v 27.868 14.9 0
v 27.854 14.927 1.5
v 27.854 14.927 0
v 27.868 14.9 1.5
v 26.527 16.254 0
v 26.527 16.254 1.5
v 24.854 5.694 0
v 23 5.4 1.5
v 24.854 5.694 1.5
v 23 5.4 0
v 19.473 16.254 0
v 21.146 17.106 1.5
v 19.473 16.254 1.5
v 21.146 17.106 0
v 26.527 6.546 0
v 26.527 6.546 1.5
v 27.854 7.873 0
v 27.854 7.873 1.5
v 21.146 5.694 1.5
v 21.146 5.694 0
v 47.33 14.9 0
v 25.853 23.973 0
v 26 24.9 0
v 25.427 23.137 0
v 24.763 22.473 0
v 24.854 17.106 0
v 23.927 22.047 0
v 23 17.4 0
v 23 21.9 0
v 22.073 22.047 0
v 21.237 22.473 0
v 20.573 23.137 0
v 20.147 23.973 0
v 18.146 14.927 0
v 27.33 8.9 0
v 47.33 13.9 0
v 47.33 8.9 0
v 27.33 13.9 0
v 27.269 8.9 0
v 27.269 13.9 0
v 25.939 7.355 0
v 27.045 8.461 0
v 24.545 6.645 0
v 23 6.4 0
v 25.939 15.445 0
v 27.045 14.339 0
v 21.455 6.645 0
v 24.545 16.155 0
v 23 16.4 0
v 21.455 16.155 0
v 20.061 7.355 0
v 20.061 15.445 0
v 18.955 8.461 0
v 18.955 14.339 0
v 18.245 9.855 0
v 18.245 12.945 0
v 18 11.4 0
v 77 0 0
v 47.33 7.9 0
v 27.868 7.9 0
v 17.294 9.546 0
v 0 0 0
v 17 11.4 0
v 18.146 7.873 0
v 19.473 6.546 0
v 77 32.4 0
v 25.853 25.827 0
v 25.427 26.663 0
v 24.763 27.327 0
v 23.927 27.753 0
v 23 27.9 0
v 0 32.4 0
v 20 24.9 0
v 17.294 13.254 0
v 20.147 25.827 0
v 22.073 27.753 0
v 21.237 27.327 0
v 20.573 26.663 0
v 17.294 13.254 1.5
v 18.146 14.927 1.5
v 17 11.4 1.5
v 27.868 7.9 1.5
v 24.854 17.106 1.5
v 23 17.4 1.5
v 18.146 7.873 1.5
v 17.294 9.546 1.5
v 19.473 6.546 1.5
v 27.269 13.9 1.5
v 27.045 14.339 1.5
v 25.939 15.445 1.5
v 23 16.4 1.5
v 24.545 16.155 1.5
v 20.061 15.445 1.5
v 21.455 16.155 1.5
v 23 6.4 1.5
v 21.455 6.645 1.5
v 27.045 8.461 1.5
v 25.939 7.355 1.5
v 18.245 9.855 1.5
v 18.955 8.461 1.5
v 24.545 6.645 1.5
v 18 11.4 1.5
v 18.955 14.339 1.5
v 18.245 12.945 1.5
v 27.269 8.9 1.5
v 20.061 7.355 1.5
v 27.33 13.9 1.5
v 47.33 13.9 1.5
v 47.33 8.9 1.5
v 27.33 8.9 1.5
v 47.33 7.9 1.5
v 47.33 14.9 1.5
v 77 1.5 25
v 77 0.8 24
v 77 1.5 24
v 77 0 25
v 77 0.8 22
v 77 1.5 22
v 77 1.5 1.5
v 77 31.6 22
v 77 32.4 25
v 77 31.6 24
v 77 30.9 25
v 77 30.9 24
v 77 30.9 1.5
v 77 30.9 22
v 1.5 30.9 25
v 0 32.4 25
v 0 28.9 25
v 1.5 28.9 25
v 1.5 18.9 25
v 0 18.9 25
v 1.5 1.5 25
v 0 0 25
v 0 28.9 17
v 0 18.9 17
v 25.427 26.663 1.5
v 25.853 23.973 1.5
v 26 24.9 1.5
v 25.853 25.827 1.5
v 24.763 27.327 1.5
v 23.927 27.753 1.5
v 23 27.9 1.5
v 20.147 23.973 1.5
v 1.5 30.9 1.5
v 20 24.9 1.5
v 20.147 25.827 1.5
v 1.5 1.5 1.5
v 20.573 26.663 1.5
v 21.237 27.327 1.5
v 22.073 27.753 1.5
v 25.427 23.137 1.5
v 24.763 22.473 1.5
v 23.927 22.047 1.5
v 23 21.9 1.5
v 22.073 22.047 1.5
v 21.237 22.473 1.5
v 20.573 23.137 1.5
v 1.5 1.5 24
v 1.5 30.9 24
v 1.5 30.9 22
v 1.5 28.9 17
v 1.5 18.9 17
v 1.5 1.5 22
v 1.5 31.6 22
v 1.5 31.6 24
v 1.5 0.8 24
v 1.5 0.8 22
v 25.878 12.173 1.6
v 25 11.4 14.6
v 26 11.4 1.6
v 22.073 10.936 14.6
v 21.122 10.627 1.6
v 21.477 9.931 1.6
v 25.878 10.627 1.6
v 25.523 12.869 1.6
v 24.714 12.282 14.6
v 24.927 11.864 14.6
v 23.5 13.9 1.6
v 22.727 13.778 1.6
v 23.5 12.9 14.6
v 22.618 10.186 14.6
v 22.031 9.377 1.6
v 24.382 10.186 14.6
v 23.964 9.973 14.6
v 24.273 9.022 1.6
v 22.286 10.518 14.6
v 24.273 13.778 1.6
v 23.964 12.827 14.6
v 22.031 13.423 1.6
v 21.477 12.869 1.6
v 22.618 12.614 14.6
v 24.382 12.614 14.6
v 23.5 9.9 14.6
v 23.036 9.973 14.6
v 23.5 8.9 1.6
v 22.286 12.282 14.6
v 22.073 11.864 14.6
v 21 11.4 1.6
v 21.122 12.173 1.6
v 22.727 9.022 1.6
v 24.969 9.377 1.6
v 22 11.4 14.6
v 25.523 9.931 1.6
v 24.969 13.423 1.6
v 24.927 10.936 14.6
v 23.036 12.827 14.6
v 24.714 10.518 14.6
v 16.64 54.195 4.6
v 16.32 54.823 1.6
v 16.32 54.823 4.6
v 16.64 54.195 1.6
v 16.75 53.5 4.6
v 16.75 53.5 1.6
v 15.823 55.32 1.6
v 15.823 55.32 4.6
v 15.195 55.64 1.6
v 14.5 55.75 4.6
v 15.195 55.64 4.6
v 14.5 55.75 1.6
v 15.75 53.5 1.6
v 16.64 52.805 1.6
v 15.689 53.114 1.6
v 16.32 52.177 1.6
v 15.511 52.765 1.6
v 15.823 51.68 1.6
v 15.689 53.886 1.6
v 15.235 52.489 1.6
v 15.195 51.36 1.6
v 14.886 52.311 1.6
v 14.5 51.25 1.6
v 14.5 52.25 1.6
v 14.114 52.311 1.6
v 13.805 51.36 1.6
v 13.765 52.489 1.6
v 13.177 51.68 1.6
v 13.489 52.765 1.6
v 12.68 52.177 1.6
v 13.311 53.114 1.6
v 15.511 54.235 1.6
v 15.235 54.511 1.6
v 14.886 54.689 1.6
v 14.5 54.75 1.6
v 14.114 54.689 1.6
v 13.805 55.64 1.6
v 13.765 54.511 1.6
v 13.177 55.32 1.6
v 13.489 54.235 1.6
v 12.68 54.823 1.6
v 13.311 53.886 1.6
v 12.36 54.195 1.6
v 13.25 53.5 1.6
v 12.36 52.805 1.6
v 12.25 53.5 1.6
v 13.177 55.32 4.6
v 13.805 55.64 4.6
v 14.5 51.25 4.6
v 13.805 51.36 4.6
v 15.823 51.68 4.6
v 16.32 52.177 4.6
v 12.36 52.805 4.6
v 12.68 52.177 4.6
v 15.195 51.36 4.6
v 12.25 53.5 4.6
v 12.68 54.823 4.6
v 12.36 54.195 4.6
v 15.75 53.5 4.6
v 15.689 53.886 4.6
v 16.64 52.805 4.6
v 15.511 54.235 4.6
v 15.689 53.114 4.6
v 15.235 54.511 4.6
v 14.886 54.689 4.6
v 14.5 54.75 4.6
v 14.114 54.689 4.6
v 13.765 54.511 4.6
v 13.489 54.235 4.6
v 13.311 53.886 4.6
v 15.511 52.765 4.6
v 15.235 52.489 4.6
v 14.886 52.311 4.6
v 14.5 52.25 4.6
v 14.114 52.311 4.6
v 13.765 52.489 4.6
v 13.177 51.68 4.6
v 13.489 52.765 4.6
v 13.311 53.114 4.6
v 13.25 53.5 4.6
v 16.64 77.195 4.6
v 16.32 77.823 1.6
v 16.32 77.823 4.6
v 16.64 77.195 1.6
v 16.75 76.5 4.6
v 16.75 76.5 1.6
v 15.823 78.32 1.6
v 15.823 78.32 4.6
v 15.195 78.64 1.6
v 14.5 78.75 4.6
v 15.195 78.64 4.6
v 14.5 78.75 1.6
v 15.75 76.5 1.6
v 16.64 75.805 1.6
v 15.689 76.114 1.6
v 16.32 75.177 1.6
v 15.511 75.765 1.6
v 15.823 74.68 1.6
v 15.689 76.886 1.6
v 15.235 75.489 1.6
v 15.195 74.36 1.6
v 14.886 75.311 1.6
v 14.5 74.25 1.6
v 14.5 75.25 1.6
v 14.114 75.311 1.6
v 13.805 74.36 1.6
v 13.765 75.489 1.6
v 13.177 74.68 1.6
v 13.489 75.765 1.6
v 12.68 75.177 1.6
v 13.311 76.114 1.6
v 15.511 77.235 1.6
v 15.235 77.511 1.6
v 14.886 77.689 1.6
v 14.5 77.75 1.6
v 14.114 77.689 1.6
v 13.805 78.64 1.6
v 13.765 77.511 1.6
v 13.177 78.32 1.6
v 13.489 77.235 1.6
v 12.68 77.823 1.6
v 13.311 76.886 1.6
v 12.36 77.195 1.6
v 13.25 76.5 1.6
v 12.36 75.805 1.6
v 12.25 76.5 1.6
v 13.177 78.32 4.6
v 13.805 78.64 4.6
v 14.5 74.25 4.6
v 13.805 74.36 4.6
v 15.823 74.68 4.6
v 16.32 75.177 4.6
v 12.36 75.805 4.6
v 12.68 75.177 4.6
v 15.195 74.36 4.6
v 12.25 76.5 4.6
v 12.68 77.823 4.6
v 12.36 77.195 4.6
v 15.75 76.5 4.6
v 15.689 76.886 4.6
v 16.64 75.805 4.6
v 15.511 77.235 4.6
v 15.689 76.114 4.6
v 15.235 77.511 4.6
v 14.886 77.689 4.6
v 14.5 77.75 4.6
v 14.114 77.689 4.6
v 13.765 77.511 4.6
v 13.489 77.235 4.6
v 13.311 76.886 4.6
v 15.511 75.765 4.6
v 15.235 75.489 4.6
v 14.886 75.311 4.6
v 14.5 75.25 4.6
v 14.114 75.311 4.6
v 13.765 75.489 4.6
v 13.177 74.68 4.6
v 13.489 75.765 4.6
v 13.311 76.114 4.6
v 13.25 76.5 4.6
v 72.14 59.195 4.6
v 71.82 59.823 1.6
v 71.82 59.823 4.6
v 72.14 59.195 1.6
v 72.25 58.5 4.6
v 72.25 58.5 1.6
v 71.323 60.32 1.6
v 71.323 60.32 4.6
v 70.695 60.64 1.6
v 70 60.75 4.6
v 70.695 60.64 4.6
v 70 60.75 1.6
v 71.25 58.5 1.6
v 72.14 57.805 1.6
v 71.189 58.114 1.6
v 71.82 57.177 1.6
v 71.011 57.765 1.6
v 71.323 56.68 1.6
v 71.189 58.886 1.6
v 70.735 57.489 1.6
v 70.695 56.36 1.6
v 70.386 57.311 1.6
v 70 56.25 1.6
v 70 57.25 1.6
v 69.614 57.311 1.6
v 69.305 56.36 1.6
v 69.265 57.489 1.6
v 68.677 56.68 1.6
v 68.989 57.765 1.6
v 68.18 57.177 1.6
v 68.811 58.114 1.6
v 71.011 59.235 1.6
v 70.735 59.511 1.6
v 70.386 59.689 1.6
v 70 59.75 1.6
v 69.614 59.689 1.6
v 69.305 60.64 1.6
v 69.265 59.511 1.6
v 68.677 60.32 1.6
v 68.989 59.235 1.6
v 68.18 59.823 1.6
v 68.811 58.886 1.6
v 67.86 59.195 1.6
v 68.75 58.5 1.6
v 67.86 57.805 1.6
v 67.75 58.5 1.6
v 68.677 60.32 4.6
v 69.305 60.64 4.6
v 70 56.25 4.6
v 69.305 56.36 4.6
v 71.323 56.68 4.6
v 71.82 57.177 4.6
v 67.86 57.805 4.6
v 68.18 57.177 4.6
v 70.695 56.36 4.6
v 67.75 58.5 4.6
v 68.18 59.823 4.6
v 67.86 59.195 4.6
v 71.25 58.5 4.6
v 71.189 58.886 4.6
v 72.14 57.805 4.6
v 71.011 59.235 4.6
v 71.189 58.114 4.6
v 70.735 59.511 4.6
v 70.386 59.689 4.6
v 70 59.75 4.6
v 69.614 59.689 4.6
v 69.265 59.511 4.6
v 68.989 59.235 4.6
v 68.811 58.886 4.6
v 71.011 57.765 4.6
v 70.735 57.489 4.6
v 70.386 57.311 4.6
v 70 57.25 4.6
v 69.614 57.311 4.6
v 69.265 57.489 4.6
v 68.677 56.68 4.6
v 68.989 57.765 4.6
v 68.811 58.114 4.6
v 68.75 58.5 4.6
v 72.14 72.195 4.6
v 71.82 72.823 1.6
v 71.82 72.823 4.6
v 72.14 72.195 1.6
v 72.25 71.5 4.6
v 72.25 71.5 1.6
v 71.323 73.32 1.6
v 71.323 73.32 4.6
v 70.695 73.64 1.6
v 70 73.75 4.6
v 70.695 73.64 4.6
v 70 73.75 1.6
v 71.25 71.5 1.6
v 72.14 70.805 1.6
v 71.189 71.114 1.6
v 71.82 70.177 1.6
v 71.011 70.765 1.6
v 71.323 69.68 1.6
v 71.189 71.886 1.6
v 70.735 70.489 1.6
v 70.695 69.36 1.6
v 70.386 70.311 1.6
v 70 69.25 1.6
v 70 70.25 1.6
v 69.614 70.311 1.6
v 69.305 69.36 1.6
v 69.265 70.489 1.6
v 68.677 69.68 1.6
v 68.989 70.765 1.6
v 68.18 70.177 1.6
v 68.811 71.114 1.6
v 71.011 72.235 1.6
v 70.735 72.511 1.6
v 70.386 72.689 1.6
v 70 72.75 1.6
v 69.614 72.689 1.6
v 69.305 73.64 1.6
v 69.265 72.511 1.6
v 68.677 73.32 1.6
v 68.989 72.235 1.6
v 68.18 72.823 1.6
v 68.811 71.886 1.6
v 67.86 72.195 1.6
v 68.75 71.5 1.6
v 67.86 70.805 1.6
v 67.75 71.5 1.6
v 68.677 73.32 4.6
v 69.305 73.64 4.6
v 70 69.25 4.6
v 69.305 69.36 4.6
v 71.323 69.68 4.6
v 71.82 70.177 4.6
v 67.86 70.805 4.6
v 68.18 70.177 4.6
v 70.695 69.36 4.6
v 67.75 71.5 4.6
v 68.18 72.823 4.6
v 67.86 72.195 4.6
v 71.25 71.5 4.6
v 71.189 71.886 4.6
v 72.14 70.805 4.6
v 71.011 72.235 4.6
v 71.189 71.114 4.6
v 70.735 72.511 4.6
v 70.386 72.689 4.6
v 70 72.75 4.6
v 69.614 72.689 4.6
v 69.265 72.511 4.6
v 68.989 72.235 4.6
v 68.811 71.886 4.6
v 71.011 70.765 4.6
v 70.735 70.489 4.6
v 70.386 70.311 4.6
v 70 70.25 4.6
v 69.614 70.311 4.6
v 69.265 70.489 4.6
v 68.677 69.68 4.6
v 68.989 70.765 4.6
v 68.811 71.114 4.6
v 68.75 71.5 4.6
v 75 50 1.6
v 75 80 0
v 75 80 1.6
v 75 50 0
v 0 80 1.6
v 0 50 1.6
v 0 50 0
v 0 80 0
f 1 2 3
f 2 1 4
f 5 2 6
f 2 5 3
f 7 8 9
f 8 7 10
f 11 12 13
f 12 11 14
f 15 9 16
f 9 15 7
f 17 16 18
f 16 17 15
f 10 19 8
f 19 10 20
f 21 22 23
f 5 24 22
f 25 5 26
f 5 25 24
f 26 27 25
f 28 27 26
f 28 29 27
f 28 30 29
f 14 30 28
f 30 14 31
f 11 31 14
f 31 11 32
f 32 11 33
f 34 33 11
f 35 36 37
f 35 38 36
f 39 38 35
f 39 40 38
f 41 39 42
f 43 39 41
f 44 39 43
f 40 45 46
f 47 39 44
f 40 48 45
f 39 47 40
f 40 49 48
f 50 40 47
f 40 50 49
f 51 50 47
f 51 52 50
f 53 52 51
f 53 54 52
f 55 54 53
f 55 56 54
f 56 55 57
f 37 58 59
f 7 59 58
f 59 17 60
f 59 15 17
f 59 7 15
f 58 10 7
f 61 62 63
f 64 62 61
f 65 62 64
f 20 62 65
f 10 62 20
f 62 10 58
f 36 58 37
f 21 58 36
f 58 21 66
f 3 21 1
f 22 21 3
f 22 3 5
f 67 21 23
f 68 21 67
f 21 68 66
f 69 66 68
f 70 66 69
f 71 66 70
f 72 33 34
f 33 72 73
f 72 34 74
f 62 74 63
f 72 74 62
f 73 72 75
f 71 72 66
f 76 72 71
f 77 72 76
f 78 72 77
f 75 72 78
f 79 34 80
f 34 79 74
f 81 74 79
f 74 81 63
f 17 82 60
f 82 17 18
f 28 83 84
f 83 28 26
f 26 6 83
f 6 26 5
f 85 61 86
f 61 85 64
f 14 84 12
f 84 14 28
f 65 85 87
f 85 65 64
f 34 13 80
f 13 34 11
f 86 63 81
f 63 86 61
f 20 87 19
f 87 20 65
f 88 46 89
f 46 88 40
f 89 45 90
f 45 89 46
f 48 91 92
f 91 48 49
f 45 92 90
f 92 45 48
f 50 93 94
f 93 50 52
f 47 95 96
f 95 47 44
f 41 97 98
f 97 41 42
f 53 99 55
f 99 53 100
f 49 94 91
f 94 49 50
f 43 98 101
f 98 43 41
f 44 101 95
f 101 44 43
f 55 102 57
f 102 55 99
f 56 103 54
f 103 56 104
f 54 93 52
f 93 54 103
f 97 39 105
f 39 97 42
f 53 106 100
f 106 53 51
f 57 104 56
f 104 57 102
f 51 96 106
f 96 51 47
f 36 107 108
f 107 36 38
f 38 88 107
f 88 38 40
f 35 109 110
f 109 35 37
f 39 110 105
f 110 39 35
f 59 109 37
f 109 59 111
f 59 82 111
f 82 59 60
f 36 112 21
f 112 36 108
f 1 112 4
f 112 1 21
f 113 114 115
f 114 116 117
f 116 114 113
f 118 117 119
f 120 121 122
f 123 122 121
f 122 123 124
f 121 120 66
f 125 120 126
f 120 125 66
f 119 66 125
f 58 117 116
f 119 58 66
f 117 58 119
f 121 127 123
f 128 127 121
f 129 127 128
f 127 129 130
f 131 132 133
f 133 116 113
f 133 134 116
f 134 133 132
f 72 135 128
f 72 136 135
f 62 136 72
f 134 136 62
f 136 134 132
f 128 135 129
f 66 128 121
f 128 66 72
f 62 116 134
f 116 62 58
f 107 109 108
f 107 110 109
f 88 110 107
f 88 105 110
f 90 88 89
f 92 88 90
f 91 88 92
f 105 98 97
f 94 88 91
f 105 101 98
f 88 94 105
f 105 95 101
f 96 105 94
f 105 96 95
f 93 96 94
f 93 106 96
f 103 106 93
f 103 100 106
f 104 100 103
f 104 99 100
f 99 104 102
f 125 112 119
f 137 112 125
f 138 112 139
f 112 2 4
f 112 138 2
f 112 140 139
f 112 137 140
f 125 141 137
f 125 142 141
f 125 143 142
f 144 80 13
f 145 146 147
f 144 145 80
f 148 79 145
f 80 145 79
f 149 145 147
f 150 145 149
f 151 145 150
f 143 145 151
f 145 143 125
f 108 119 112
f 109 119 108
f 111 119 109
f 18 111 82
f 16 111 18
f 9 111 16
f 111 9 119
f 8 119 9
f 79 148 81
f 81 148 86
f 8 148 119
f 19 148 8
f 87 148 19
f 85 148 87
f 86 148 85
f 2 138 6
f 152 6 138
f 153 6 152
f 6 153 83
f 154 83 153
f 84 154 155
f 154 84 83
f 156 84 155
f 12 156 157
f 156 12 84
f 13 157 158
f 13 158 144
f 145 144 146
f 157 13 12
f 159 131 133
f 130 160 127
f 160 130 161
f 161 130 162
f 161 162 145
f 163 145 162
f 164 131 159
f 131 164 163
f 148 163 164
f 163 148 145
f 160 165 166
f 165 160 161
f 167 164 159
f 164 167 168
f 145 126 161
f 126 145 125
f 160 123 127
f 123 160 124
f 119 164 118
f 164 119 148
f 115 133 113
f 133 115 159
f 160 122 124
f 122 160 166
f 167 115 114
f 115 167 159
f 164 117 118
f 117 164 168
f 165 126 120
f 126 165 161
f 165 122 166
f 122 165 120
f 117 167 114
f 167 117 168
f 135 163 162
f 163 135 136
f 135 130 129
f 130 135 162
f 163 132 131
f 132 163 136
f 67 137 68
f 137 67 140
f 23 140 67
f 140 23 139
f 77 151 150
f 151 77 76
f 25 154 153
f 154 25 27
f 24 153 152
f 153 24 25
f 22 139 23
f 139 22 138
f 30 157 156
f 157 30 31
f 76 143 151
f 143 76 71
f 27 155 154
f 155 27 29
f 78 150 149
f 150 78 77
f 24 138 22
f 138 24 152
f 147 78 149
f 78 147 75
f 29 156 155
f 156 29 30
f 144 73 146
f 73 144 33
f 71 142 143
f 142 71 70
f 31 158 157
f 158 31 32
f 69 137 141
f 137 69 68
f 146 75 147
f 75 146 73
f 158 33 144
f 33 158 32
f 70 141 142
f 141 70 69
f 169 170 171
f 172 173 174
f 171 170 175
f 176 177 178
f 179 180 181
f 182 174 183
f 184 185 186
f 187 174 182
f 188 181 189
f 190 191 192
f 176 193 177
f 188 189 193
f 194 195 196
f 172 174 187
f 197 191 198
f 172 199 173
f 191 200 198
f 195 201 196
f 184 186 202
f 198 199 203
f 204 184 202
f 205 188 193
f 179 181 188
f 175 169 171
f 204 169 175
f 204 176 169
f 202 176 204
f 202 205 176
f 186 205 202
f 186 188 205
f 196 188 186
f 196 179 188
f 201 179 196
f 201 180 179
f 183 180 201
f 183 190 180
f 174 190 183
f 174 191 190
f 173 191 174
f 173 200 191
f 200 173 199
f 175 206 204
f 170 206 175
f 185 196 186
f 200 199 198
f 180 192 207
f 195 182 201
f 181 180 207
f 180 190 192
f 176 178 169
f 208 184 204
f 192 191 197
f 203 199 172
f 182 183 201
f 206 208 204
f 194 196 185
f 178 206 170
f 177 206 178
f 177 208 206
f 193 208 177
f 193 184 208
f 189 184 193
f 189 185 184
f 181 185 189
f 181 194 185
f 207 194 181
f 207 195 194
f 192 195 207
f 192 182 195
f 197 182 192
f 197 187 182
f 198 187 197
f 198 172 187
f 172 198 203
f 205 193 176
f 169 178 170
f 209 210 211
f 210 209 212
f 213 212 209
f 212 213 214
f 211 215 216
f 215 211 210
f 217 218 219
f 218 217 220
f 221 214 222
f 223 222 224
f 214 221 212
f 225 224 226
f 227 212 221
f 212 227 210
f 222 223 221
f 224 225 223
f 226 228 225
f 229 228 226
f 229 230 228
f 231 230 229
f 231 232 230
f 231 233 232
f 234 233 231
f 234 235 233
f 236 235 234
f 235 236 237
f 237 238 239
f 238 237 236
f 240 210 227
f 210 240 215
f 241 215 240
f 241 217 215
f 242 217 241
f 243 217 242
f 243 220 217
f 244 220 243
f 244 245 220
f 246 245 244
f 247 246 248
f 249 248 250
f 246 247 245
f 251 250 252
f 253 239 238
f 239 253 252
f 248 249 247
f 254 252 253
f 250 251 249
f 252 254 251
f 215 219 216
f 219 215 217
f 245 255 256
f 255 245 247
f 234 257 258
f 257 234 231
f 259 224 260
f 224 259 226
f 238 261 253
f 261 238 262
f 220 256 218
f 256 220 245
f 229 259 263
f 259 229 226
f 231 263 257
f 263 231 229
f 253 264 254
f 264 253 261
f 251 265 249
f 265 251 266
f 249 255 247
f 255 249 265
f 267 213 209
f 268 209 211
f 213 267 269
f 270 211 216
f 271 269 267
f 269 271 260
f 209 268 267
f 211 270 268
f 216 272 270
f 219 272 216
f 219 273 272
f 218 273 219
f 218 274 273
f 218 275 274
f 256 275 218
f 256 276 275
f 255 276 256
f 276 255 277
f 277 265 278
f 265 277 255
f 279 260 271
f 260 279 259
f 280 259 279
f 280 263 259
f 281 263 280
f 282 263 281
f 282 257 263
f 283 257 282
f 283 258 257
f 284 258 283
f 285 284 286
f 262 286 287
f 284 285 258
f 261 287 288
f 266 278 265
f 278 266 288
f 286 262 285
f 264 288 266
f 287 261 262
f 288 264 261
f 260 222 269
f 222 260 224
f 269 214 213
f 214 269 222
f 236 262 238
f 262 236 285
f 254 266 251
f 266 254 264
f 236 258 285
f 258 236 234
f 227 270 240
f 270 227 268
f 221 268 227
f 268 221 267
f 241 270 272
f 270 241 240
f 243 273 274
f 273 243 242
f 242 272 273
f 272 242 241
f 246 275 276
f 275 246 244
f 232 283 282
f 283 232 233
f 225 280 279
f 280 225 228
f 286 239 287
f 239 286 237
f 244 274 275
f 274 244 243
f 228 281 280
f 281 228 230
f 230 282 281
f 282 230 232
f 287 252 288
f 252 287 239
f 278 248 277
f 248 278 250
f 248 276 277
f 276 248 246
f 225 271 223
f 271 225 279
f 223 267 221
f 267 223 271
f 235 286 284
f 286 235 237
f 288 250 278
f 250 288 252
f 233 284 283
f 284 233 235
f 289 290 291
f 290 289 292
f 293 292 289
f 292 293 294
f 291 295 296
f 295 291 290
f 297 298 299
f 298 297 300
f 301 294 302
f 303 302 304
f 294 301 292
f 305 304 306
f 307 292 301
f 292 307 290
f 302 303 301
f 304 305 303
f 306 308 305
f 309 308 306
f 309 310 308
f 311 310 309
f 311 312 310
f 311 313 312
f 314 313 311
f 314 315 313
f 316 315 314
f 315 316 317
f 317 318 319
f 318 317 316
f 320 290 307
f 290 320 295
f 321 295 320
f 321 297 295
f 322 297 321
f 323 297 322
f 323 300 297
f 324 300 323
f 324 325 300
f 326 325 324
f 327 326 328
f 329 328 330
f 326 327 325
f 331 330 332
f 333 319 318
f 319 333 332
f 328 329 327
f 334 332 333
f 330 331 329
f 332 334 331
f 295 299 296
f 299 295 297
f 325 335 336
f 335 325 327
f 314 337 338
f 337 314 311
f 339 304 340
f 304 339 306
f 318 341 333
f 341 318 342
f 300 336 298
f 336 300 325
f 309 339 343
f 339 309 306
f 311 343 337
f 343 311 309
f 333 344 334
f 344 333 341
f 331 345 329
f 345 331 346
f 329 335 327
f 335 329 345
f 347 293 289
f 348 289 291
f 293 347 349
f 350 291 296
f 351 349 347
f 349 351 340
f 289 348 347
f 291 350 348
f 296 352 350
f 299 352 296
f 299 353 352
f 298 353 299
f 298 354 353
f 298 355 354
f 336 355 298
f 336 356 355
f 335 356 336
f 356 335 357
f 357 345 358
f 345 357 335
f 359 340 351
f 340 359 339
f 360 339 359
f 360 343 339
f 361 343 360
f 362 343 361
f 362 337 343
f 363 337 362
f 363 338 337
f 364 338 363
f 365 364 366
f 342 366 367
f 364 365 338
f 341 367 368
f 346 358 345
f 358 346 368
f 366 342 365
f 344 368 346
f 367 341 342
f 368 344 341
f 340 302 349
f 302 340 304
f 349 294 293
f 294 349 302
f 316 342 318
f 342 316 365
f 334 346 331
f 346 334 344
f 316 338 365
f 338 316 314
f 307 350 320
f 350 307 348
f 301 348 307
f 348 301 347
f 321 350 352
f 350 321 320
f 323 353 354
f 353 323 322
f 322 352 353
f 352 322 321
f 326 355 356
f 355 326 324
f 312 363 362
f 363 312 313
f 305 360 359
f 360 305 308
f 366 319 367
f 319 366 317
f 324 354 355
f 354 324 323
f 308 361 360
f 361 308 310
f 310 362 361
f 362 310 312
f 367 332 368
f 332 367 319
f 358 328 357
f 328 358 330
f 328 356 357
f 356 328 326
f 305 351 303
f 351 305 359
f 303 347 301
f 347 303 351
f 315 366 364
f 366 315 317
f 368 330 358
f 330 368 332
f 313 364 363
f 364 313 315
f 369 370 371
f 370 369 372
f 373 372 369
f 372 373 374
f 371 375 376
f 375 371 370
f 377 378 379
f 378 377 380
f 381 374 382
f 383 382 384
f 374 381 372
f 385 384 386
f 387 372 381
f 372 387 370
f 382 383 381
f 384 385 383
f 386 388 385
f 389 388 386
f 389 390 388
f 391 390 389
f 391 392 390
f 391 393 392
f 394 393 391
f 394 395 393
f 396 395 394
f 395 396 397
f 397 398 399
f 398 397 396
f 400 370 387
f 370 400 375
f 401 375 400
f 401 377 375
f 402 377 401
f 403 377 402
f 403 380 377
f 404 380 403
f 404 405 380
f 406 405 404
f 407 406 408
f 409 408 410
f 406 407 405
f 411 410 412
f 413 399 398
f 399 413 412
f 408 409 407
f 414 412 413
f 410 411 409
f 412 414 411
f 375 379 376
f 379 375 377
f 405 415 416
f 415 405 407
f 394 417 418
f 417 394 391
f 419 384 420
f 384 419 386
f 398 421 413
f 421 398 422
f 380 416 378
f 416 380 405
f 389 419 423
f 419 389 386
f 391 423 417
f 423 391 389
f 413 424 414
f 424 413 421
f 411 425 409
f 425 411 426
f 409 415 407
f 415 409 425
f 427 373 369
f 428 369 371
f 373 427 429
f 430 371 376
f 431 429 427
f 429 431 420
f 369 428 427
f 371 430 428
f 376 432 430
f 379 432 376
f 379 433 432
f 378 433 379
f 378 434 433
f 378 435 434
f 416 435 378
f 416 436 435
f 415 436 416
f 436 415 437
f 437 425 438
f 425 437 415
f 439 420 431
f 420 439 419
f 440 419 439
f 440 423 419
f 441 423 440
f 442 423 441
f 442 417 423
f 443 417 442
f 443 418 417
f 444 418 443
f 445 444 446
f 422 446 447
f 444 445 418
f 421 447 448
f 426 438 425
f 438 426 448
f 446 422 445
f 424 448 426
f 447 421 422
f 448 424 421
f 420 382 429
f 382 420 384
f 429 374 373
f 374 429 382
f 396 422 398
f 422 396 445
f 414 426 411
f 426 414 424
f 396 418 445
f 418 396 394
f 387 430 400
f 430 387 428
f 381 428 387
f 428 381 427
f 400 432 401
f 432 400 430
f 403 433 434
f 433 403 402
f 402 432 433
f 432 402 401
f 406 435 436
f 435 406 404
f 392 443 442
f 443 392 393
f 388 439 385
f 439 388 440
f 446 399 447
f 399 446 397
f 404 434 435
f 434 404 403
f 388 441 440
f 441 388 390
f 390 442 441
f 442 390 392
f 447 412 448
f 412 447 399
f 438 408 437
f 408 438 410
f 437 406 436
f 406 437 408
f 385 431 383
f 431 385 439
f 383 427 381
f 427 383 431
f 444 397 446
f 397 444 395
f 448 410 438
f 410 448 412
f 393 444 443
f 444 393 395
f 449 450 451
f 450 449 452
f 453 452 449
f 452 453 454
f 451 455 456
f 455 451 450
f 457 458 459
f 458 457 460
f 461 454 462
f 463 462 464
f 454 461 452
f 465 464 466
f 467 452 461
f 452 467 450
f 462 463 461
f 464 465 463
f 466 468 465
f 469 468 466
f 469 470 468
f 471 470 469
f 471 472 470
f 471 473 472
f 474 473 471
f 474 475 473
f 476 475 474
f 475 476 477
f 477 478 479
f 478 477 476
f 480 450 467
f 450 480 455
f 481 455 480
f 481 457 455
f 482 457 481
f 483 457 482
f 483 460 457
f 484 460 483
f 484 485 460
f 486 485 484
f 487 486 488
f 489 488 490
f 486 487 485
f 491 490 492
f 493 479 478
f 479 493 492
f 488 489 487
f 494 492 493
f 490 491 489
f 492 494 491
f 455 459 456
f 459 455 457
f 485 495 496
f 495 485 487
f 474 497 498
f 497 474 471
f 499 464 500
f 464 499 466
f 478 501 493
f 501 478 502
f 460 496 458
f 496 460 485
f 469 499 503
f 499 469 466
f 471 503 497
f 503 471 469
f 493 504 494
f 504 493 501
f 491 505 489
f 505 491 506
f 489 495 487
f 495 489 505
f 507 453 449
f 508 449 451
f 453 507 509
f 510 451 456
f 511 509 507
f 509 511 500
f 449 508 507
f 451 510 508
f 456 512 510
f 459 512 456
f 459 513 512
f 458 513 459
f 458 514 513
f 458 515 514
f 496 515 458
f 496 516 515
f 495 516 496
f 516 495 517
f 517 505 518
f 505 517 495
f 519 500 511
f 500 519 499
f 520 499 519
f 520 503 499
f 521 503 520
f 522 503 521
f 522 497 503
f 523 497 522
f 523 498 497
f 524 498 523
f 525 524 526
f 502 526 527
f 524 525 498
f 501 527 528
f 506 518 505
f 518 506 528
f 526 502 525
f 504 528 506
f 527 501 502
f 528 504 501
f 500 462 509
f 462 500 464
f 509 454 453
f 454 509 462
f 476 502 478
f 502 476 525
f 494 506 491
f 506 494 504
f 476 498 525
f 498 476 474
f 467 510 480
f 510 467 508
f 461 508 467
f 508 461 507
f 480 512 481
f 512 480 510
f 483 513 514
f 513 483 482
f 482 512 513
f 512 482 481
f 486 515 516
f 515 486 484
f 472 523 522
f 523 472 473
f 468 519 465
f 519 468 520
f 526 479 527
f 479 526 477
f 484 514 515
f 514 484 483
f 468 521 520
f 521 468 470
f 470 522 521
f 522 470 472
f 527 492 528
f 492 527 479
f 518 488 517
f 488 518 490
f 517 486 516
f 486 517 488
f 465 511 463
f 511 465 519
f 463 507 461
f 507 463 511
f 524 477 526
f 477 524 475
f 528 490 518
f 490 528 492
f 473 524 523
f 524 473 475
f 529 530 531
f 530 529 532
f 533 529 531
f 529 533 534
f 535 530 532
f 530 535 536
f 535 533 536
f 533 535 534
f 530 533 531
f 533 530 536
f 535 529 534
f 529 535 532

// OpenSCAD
boardWidth = 30;
boardLength = 75;
boardThickness = 1.6;
wallThickness = 1.5;
gap = .5;
caseHeight = 25;
caseLength = boardLength+wallThickness+gap;
caseWidth = boardWidth+2*wallThickness-2*gap+.4;
buttonRad = 5;
cutWidth = 1;

// The standoffs are sized for tiny screws I pulled out of an old laptop.
// Printed on a 0.5 mm nozzle, so if using a smaller nozzle may want to
// shrink the boardScrewDiam a tad.

boardHole1PosX = 14.5;
boardHole1PosY = 3.5;
boardHole2PosX = boardLength-5;
boardHole2PosY = 8.5;
boardScrewDiam = 2.5;
standoffHeight = 3;
slop = 0.4;

caseTop();

translate([0,50,0])
caseBottom();

module caseBottom() 
{
    cube([boardLength,boardWidth,boardThickness]);
    translate([boardHole1PosX,boardHole1PosY,boardThickness])
    difference()
    {
        cylinder(d=boardScrewDiam+2,h=standoffHeight,$fn=20);
        cylinder(d=boardScrewDiam,h=standoffHeight,$fn=20);
    }
    translate([boardHole1PosX,boardWidth-boardHole1PosY,boardThickness])
    difference()
    {
        cylinder(d=boardScrewDiam+2,h=standoffHeight,$fn=20);
        cylinder(d=boardScrewDiam,h=standoffHeight,$fn=20);
    }    translate([boardHole2PosX,boardHole2PosY,boardThickness])
    difference()
    {
        cylinder(d=boardScrewDiam+2,h=standoffHeight,$fn=20);
        cylinder(d=boardScrewDiam,h=standoffHeight,$fn=20);
    }
    translate([boardHole2PosX,boardWidth-boardHole2PosY,boardThickness])
    difference()
    {
        cylinder(d=boardScrewDiam+2,h=standoffHeight,$fn=20);
        cylinder(d=boardScrewDiam,h=standoffHeight,$fn=20);
    }

}
module caseTop()
{
difference()
{
    cube([caseLength,caseWidth,caseHeight]);
    // carve out general insides
    translate([wallThickness,wallThickness,wallThickness])
    cube([caseLength-wallThickness,caseWidth-2*wallThickness,caseHeight]);
    // carve out slots for board
    translate([wallThickness,0.5*(caseWidth-boardWidth)-slop,caseHeight-3])
    cube([caseLength,boardWidth+2*slop,boardThickness+slop]);
    // carve out sensor wire slot
    translate([0,caseWidth-12-wallThickness,caseHeight-8])
    cube([wallThickness,10,8+boardThickness]);   
    // carve out button press 
    translate([22+1,caseWidth-21,0])
    {
        difference()
        {
            cylinder(r=buttonRad+cutWidth,h=boardThickness,$fn=20);
            cylinder(r=buttonRad, h=boardThickness,$fn=20);
            translate([0,-.5*buttonRad,0])
            cube([2*buttonRad,buttonRad,boardThickness]);
        }
        
        translate([sqrt(3)/2*buttonRad,-0.5*buttonRad-cutWidth,0])
        cube([20,cutWidth,boardThickness]);
        translate([sqrt(3)/2*buttonRad,0.5*buttonRad,0])
        cube([20,cutWidth,boardThickness]);
    }
    
    // carve out LED view hole
    
    translate([22+1,caseWidth-6-wallThickness,0])
    cylinder(r=3,h=boardThickness,$fn=20);
}

translate([wallThickness+22,caseWidth-21,boardThickness])
cylinder(d1=5,d2=3,h=caseHeight-12,$fn=20);
}
